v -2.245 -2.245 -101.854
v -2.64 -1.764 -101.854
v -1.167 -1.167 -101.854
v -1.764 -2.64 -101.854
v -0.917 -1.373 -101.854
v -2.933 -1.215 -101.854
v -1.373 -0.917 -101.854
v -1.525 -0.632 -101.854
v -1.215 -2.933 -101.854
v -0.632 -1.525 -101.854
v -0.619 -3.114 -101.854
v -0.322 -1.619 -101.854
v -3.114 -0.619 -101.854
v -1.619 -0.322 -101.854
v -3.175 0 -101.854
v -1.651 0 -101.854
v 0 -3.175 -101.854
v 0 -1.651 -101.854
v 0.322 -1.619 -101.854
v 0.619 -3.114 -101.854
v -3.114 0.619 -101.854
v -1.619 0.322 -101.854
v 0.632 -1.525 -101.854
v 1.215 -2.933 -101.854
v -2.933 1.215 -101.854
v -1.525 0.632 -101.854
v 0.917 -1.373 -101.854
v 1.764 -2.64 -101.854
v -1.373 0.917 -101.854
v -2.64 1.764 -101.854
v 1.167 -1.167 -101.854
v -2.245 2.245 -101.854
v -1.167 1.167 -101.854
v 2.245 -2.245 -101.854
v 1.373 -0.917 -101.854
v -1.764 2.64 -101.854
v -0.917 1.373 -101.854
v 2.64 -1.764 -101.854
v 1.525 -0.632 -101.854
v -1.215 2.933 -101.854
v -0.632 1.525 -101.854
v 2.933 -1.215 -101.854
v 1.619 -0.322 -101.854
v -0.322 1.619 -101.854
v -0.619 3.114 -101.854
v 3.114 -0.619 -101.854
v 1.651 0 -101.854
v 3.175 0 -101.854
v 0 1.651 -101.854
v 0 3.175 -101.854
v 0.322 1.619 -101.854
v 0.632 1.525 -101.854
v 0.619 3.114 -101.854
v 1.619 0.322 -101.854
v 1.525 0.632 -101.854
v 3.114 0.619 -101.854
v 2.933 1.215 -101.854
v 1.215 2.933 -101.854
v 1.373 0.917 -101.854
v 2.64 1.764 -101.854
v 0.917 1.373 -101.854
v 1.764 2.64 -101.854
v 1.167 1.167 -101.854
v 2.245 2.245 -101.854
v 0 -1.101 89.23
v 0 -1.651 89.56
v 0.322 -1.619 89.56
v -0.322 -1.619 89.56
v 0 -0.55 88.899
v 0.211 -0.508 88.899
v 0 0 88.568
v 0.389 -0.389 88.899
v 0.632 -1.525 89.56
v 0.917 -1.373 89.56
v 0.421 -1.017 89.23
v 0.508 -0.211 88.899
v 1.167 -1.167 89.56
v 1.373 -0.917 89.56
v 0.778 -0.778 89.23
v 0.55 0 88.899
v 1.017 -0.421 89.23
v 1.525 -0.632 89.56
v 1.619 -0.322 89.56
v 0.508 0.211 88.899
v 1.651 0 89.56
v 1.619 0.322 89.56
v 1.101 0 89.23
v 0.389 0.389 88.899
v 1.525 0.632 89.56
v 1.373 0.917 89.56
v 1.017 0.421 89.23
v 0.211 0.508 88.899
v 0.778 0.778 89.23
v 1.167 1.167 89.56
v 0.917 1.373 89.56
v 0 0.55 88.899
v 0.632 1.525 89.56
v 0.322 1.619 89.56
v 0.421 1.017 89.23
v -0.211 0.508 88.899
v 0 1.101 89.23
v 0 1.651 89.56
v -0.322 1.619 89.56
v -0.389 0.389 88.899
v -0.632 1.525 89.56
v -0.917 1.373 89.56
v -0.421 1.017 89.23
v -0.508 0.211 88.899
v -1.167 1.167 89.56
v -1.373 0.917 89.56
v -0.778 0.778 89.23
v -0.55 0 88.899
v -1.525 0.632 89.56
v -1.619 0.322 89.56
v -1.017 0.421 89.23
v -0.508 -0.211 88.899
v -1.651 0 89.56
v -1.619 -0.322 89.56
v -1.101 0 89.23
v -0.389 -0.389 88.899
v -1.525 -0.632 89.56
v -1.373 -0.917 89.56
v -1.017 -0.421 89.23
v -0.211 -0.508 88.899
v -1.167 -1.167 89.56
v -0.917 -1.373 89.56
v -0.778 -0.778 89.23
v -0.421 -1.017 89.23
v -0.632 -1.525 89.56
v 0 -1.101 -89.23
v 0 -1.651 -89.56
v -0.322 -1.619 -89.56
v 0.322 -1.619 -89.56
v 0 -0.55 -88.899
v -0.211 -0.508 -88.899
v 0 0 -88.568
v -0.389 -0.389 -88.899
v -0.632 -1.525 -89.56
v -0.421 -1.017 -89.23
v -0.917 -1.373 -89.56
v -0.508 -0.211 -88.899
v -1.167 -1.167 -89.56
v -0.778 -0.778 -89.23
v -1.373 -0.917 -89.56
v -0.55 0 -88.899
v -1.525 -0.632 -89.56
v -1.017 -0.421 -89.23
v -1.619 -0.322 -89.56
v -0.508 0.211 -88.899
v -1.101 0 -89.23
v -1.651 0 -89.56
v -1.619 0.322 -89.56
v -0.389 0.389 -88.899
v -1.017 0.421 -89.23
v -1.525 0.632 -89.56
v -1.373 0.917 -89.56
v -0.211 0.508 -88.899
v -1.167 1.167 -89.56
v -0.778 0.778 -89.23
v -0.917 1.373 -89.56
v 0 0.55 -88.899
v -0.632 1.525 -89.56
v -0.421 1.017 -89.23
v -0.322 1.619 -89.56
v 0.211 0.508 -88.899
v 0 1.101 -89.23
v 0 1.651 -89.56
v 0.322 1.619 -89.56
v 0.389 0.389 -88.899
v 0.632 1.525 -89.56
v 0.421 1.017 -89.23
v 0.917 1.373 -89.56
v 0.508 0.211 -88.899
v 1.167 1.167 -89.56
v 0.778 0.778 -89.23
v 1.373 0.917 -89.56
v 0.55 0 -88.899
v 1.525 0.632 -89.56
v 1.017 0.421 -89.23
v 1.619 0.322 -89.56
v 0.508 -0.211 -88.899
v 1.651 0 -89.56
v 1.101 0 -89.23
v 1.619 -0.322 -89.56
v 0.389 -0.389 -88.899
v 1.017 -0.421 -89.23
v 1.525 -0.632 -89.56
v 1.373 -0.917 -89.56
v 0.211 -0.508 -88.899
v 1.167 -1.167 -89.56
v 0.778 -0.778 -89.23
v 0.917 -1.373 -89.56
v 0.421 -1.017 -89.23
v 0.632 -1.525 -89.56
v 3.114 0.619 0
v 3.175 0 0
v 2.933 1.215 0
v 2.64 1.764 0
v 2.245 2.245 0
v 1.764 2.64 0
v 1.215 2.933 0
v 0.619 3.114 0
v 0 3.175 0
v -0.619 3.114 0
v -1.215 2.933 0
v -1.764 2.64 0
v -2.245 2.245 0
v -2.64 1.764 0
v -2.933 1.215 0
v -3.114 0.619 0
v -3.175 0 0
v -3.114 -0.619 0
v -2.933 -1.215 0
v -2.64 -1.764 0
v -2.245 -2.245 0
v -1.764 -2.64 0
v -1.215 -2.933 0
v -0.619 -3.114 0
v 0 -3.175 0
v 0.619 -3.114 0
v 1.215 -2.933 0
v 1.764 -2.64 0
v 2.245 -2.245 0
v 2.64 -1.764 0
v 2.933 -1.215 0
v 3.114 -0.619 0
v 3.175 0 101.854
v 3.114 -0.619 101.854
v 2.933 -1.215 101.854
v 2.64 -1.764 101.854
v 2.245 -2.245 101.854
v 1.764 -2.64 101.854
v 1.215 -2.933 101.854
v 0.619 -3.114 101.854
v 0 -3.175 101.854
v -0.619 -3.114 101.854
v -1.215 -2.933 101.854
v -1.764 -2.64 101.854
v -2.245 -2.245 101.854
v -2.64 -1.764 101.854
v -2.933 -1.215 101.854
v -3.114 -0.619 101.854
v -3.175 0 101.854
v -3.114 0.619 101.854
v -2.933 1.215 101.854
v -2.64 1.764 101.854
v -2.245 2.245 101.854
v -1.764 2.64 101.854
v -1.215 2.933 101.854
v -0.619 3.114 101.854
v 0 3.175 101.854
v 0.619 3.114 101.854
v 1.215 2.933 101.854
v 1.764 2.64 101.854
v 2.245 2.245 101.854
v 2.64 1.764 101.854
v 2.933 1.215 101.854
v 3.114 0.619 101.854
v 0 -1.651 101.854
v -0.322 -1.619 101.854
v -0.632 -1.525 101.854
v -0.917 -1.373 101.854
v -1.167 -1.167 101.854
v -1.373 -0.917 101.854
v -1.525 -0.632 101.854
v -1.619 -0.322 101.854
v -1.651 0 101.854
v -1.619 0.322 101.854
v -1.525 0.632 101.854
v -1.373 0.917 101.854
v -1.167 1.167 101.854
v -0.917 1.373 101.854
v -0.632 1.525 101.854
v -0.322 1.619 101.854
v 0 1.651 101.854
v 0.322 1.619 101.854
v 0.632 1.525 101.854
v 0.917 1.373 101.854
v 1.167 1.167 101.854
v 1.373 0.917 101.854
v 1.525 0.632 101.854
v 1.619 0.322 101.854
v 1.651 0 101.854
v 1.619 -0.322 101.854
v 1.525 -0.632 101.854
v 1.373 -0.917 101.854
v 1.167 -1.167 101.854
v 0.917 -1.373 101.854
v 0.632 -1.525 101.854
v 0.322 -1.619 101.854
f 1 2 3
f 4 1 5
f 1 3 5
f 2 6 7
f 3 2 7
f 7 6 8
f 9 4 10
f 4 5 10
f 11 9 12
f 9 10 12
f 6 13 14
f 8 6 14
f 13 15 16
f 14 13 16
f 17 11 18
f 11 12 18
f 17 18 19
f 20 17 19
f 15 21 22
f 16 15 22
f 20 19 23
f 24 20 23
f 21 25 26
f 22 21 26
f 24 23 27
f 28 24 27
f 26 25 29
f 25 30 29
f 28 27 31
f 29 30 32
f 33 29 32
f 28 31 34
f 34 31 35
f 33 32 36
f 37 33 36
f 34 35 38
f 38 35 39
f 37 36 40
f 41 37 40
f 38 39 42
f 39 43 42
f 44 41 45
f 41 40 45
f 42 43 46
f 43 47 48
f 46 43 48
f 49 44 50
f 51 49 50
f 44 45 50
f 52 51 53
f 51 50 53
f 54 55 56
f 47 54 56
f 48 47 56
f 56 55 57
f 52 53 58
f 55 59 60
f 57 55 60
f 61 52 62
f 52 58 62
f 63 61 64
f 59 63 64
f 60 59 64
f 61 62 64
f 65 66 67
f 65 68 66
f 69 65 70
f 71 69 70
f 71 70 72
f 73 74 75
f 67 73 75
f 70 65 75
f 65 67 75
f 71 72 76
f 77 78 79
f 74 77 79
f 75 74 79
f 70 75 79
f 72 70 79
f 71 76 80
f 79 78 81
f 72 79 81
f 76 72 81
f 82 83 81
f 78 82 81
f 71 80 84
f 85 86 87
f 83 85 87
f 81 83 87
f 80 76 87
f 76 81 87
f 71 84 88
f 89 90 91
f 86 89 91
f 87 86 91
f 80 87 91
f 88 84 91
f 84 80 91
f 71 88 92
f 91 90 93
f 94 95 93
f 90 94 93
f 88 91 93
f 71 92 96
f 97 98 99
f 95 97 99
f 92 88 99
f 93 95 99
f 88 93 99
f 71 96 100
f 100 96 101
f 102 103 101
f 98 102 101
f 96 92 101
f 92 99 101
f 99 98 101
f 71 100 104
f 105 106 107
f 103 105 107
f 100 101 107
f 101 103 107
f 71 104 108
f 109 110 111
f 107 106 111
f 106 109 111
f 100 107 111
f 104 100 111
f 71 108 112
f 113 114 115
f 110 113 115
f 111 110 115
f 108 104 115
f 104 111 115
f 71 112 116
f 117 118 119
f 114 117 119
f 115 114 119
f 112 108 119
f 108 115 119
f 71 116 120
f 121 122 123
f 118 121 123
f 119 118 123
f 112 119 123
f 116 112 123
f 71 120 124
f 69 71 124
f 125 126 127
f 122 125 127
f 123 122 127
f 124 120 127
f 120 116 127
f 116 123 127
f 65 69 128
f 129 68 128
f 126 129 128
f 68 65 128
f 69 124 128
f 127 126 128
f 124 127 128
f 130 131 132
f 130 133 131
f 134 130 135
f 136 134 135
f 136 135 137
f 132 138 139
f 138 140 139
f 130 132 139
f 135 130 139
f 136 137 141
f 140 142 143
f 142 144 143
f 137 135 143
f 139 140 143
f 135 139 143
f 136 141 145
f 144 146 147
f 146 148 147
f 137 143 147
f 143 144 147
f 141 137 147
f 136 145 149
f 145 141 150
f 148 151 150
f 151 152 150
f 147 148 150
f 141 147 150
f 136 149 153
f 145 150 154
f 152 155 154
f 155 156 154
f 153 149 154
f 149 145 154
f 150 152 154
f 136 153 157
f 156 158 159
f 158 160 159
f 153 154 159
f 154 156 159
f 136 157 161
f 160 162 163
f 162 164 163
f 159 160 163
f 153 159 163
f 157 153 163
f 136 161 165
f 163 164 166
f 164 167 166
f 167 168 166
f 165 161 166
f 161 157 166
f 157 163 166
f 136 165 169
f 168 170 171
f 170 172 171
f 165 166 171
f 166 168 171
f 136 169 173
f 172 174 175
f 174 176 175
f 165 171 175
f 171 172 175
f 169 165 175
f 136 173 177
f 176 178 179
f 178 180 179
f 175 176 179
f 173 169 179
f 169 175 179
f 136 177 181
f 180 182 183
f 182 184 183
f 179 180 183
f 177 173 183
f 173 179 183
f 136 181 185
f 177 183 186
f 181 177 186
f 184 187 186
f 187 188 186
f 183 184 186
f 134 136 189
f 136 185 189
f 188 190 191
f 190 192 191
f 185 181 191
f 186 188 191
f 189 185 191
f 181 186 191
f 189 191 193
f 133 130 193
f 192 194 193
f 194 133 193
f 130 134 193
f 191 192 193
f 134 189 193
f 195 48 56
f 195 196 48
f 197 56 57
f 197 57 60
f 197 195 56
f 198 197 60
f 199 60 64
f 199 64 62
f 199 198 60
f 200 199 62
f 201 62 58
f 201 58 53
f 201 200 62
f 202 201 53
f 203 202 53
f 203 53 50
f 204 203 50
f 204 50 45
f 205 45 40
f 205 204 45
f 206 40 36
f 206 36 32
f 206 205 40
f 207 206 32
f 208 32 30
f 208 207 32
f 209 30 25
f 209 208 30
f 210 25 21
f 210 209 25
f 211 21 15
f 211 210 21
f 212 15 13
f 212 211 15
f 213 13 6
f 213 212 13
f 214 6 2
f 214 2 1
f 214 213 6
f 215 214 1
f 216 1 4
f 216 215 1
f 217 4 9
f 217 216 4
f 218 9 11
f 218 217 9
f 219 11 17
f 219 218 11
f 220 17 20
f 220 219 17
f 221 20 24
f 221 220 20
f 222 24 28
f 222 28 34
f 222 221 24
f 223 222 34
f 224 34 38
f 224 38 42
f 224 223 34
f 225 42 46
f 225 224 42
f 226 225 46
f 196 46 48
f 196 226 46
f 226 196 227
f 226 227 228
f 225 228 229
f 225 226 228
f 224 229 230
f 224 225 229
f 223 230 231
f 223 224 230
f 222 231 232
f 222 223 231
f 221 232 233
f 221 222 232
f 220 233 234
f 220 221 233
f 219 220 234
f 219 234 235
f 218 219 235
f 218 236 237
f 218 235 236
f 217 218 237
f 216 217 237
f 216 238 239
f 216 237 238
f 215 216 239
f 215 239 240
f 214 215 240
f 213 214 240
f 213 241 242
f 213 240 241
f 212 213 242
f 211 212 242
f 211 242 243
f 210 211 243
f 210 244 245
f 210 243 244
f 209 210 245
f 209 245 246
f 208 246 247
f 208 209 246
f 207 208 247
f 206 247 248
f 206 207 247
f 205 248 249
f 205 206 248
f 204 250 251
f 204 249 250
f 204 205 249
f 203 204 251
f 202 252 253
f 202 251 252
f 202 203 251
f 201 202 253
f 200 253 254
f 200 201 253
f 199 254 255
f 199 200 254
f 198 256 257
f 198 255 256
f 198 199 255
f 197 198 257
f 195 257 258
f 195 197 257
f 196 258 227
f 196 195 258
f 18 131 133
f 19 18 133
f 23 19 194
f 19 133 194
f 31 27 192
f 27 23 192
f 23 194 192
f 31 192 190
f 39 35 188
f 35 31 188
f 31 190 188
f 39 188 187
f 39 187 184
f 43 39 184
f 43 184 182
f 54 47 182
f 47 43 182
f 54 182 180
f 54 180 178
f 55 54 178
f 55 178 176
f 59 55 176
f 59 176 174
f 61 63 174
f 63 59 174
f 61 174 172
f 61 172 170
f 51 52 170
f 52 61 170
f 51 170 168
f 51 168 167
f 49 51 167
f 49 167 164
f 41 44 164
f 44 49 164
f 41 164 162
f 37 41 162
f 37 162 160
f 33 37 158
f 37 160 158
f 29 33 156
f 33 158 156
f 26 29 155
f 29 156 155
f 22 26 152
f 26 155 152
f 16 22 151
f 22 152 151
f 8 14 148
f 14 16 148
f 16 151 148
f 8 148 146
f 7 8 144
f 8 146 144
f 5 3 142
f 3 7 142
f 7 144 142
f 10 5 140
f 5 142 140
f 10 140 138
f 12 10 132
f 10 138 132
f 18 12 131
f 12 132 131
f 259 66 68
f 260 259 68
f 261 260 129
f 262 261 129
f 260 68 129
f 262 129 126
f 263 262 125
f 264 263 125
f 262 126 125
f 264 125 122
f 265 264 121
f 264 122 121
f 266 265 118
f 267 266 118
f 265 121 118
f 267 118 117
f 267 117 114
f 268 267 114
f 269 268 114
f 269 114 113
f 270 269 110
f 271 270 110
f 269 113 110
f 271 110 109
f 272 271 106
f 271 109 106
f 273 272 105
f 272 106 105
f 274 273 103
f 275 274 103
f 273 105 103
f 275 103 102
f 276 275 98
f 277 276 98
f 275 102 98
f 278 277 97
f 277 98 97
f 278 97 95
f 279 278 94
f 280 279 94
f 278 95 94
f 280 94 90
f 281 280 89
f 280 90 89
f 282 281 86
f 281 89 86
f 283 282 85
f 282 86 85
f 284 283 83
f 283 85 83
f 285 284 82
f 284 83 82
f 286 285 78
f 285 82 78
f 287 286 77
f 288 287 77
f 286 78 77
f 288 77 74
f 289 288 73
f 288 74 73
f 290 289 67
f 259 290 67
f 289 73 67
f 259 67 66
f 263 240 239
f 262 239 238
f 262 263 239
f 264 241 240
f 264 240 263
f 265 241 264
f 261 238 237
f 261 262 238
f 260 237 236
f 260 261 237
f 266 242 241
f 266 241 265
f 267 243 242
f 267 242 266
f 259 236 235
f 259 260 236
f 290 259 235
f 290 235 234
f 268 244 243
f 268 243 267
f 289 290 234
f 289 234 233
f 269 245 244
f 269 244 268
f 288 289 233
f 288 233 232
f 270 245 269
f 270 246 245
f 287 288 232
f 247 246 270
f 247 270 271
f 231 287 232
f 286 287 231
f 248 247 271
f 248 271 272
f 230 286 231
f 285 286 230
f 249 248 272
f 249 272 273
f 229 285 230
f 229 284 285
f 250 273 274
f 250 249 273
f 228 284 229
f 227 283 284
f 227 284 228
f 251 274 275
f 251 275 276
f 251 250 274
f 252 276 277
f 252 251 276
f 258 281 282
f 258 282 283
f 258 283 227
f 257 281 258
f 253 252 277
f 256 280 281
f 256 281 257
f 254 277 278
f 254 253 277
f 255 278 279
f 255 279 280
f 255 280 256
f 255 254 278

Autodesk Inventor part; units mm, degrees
ref_plane "YZ Plane" through (0, 0, 0) normal (1, 0, 0) x (0, 1, 0)
ref_plane "XZ Plane" through (0, 0, 0) normal (0, 1, 0) x (-1, 0, 0)
ref_plane "XY Plane" through (0, 0, 0) normal (0, 0, 1) x (1, 0, 0)
sketch "Sketch1" plane through (0, 0, 0) normal (0, 0, 1) x (1, 0, 0)
  circle A0 centre (0, 0) radius 3.175
  dimension "d0" = 6.35
extrude "Extrusion1" add sketch "Sketch1" along normal mid plane 203.708
sketch "Sketch2" plane through (0, 0, 101.854) normal (0, 0, 1) x (1, 0, 0)
  point P0 (0, 0)
  point P1 (0, 0)
hole "Hole1" at (0, 0, 101.854) direction (0, 0, -1) diameter 3.302 depth 12.2936 tip angle 118 thread size "8-32 UNC" class "2B" standard "ANSI Unified Screw Threads"
mirror "Mirror1" about plane through (0, 0, 0) normal (0, 0, 1) of "Hole1"
